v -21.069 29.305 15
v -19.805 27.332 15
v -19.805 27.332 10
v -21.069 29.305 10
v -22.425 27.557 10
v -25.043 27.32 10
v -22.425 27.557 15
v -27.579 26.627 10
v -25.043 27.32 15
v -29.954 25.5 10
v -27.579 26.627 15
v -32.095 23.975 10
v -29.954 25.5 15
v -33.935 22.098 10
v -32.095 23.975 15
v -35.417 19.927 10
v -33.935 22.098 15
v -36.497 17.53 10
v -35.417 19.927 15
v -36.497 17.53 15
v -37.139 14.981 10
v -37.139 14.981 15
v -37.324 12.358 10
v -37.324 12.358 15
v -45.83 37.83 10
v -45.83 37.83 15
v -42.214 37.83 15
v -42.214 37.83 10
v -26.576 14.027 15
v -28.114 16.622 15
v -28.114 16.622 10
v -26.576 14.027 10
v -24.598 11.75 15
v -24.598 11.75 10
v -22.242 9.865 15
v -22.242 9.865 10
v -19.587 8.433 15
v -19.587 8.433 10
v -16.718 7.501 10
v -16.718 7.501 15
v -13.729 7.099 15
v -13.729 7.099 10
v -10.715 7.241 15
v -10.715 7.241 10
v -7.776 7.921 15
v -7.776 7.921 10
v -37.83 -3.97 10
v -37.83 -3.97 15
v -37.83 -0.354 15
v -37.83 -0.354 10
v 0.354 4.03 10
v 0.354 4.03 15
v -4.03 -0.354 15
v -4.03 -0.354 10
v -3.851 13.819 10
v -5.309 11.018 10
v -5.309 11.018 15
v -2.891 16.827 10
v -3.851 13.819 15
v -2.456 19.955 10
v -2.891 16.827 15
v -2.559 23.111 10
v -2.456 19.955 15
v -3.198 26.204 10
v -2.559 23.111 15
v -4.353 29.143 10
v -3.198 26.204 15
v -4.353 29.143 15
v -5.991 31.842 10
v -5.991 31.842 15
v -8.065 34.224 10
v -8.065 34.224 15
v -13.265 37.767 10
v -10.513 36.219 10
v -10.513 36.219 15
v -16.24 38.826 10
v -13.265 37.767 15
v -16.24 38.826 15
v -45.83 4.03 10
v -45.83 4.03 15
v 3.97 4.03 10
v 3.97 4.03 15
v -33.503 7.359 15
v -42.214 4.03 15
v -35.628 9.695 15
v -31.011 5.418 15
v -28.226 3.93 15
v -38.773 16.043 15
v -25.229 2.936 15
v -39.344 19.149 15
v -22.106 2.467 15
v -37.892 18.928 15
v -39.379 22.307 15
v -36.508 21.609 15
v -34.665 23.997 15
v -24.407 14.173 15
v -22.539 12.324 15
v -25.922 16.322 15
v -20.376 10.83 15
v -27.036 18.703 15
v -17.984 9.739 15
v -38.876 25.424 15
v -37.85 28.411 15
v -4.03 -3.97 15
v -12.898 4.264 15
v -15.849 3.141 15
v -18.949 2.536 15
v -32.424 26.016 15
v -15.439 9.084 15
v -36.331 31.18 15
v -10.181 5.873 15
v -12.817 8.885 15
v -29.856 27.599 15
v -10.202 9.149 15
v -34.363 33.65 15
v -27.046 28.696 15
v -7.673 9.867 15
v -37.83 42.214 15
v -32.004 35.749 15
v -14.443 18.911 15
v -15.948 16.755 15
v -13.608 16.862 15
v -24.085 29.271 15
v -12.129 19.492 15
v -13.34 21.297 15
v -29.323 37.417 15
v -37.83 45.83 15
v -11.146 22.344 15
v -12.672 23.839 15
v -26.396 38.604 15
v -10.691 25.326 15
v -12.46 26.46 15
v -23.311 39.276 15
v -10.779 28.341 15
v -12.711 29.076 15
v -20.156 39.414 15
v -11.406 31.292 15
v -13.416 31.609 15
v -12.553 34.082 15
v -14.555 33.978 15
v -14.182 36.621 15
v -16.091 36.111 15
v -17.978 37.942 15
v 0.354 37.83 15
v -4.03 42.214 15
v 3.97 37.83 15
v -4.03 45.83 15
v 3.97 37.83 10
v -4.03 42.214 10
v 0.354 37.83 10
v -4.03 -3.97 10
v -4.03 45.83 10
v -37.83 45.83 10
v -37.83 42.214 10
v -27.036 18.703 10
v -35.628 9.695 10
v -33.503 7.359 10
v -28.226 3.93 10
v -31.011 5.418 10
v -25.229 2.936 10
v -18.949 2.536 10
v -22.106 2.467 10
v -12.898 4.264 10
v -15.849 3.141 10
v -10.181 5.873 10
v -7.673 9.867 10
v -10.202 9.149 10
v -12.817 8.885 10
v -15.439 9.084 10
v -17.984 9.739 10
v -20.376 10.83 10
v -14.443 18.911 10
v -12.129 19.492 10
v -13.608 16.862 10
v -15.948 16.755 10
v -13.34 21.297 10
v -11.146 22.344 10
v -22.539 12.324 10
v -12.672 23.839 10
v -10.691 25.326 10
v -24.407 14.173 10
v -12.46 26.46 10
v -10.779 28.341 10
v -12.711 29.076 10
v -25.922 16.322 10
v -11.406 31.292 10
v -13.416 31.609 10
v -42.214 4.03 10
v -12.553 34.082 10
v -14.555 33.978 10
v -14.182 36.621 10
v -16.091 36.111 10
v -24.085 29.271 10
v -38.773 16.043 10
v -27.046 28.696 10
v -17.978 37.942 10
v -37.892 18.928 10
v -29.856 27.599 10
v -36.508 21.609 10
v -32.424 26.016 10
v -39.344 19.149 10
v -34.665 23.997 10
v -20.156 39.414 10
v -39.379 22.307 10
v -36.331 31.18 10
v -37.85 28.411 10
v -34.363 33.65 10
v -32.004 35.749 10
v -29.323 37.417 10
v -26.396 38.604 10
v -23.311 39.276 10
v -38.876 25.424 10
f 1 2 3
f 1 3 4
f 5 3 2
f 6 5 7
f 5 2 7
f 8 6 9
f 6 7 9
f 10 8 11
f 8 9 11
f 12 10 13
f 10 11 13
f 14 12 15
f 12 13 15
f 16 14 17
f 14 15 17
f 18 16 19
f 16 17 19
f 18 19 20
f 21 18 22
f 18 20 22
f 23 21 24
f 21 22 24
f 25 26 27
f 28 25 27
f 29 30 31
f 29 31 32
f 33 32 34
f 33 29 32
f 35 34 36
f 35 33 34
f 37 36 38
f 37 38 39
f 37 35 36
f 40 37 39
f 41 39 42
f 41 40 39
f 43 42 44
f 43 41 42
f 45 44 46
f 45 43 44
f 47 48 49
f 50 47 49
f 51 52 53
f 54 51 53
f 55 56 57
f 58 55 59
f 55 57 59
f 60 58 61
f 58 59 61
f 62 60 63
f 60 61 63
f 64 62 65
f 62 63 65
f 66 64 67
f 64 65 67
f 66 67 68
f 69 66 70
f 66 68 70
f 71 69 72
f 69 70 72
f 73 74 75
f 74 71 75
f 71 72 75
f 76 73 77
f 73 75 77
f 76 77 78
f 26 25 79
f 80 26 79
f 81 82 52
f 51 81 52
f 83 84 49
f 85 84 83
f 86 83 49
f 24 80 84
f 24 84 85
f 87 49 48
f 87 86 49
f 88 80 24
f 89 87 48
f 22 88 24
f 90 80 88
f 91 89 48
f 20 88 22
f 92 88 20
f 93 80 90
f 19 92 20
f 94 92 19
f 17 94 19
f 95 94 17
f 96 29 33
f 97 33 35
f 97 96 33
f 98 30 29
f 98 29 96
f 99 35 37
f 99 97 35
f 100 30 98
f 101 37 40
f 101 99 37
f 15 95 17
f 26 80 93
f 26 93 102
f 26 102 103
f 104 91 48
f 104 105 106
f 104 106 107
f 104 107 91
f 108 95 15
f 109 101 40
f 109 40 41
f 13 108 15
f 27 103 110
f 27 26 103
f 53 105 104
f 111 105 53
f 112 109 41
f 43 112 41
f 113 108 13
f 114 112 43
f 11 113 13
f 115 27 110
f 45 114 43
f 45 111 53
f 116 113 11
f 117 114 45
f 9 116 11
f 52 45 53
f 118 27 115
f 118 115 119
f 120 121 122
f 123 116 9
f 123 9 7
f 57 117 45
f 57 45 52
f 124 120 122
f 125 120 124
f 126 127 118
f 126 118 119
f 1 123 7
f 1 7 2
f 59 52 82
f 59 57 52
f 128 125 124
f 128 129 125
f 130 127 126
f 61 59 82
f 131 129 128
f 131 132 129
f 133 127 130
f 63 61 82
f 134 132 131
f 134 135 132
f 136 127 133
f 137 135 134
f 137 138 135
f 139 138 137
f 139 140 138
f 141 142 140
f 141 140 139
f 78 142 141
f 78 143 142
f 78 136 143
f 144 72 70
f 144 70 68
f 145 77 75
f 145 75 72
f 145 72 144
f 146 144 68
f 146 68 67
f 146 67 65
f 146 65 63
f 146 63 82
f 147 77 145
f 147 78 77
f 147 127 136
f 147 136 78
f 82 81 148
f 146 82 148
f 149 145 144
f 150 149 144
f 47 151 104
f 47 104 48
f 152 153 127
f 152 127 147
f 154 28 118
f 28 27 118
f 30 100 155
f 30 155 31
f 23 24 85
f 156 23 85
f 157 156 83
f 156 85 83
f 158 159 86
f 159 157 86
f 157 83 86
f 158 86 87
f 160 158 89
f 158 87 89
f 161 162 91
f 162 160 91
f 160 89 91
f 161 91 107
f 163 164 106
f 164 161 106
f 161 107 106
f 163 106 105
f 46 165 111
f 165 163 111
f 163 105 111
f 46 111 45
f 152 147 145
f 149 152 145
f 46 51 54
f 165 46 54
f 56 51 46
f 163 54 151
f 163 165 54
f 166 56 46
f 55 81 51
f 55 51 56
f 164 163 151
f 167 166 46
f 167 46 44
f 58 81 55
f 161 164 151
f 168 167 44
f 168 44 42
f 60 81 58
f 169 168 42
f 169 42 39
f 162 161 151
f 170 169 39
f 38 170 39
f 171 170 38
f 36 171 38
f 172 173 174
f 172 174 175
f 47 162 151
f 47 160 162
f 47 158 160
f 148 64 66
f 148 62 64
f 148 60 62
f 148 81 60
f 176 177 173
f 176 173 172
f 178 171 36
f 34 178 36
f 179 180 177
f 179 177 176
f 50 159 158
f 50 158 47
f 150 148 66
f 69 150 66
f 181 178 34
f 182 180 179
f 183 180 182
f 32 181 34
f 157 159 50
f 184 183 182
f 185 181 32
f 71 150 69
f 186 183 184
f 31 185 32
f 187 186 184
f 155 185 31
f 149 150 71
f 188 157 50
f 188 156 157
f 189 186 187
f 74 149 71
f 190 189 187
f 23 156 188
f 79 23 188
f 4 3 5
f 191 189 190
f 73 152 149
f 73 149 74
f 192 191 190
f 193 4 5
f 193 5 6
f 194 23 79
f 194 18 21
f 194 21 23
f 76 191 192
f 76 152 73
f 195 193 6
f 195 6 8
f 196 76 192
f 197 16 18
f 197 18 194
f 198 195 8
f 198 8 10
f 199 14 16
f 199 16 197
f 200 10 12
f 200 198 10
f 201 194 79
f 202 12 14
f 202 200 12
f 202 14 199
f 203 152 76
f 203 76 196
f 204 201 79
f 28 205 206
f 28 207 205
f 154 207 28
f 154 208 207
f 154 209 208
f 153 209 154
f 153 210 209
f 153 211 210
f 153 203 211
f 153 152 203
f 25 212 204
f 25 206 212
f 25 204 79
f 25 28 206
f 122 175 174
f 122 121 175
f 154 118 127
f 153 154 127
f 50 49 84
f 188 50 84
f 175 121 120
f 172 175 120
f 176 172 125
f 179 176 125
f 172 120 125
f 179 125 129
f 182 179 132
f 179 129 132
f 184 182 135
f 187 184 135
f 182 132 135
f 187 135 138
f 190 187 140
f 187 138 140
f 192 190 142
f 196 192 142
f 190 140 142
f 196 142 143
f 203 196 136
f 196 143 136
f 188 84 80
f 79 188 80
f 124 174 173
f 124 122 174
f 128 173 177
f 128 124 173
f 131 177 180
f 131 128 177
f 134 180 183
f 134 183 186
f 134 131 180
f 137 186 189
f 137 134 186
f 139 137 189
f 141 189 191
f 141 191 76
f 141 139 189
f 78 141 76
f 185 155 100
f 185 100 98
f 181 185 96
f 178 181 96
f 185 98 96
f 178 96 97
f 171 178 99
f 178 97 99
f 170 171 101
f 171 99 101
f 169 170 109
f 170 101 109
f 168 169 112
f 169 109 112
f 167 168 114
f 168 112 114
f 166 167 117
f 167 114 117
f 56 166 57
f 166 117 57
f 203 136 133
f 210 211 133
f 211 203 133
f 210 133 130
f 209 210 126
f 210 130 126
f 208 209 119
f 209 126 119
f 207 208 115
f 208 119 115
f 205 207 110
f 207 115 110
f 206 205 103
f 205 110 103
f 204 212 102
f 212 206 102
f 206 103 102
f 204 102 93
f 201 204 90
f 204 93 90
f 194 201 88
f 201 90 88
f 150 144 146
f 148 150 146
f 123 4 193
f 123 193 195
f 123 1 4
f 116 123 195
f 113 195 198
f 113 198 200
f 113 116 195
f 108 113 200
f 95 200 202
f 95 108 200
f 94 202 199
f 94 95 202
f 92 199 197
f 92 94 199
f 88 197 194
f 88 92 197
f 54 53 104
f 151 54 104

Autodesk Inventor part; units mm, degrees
ref_plane "YZ Plane" through (0, 0, 0) normal (1, 0, 0) x (0, 1, 0)
ref_plane "Work Plane1" through (0, 0, 10) normal (0, 0, 1) x (1, 0, 0)
sketch "Sketch1" plane through (0, 0, 10) normal (0, 0, 1) x (1, 0, 0)
  line L0 (-4.0299, -0.3538) -> (-2.2322, 1.4439) construction
  arc A0 (-1.4439, 2.2322) -> (-2.2322, 1.4439) centre (-0.9299, 0.9299) ccw construction
  line L1 (-1.4439, 2.2322) -> (0.3538, 4.0299) construction
  line L2 (-37.8299, 42.2137) -> (-37.8299, 45.8299) construction
  line L3 (-37.8299, 45.8299) -> (-4.0299, 45.8299) construction
  line L4 (-4.0299, 45.8299) -> (-4.0299, 42.2137) construction
  line L5 (-4.0299, 4.0299) -> (0.3538, 4.0299) projected
  line L6 (-20.9299, 58.9723) -> (17.1124, 20.9299) construction
  line L7 (17.1124, 20.9299) -> (-20.9299, -17.1124) construction
  line L8 (-20.9299, -17.1124) -> (-58.9723, 20.9299) construction
  line L9 (-58.9723, 20.9299) -> (-20.9299, 58.9723) construction
  line L10 (-20.9299, 58.9723) -> (-20.9299, -17.1124) construction
  line L11 (17.1124, 20.9299) -> (-58.9723, 20.9299) construction
  line L12 (-20.9299, 58.9723) -> (32.8701, 58.9723) construction
  line L13 (-43.4299, 43.4299) -> (1.5701, 43.4299) construction
  line L14 (1.5701, 43.4299) -> (1.5701, -1.5701) construction
  line L15 (1.5701, -1.5701) -> (-43.4299, -1.5701) construction
  line L16 (-43.4299, -1.5701) -> (-43.4299, 43.4299) construction
  line L17 (-43.4299, 43.4299) -> (1.5701, -1.5701) construction
  line L18 (1.5701, 43.4299) -> (-43.4299, -1.5701) construction
  line L19 (-43.4299, 5.3876) -> (-43.4299, 36.4723)
  line L20 (-43.4299, 36.4723) -> (-36.4723, 43.4299)
  line L21 (-36.4723, 43.4299) -> (-5.3876, 43.4299)
  line L22 (-5.3876, 43.4299) -> (1.5701, 36.4723)
  line L23 (1.5701, 36.4723) -> (1.5701, 5.3876)
  line L24 (1.5701, 5.3876) -> (-5.3876, -1.5701)
  line L25 (-5.3876, -1.5701) -> (-36.4723, -1.5701)
  line L26 (-36.4723, -1.5701) -> (-43.4299, 5.3876)
  line L27 (-4.0299, 42.2137) -> (-37.8299, 42.2137) projected
  line L28 (-4.0299, -0.3538) -> (-4.0299, 4.0299) projected
  circle A1 centre (-20.9299, 20.9299) radius 13.3985
  circle A2 centre (-20.9299, 20.9299) radius 15.4895
  point P0 (-37.8299, 4.0299)
  dimension "d18" = 53.8
  dimension "d19" = 45
  dimension "d20" = 53.8
  dimension "d21" = 45
  dimension "d22" = 45
  dimension "d30" = 26.797
  dimension "d36" = 30.979
extrude "Extrusion1" add sketch "Sketch1" along normal blind 5 contours L28 L24 L25 L26 L19 L20 L27 L22 L23 L5 | L5 L24 L28 | L27 L20 L21 L22 | A1 | A2
ref_plane "Work Plane2" through (-40.9959, 0.8639, 22.2359) normal (0, 0, 1) x (1, 0, 0)
sketch "Sketch3" plane through (0, 0, 10) normal (0, 0, -1) x (-1, 0, 0)
  line L0 (37.8299, -0.4701) -> (37.8299, 4.0299) construction
  line L1 (4.0299, 4.0299) -> (4.0299, -0.4701) construction
  line L2 (37.8299, -0.4701) -> (37.8299, 1.1886) construction
  line L3 (4.0299, -3.9701) -> (4.0299, -0.3538) construction
  line L4 (45.8299, 4.0299) -> (42.2137, 4.0299) construction
  line L5 (-0.3538, 4.0299) -> (-3.9701, 4.0299) construction
  line L6 (-3.9701, 37.8299) -> (-0.3538, 37.8299) construction
  line L7 (4.0299, 42.2137) -> (4.0299, 45.8299) construction
  line L8 (37.8299, 45.8299) -> (37.8299, 42.2137) construction
  line L9 (42.2137, 37.8299) -> (45.8299, 37.8299) construction
  line L10 (37.8299, 37.7299) -> (45.8299, 37.7299)
  line L11 (45.8299, 37.7299) -> (45.8299, 4.1299)
  line L12 (45.8299, 4.1299) -> (37.8299, 4.1299)
  line L13 (37.8299, 4.1299) -> (37.8299, 37.7299)
  line L14 (37.7299, 4.0299) -> (4.1299, 4.0299)
  line L15 (4.1299, 4.0299) -> (4.1299, -3.9701)
  line L16 (4.1299, -3.9701) -> (37.7299, -3.9701)
  line L17 (37.7299, -3.9701) -> (37.7299, 4.0299)
  line L18 (4.0299, 4.1299) -> (-3.9701, 4.1299)
  line L19 (-3.9701, 4.1299) -> (-3.9701, 37.7299)
  line L20 (-3.9701, 37.7299) -> (4.0299, 37.7299)
  line L21 (4.0299, 37.7299) -> (4.0299, 4.1299)
  line L22 (4.1299, 37.8299) -> (37.7299, 37.8299)
  line L23 (37.7299, 37.8299) -> (37.7299, 45.8299)
  line L24 (37.7299, 45.8299) -> (4.1299, 45.8299)
  line L25 (4.1299, 45.8299) -> (4.1299, 37.8299)
  point P0 (0, 0)
  dimension "d23" = 0.1
  dimension "d24" = 0.1
  dimension "d25" = 0.1
  dimension "d26" = 0.1
  dimension "d27" = 0.1
extrude "Extrusion3" add sketch "Sketch3" against normal up to surface (5 mm away)
sketch "Sketch6" plane through (0, 0, 15) normal (0, 0, 1) x (1, 0, 0)
  circle A0 centre (-20.9299, 20.9299) radius 18.5
  circle A1 centre (-20.9299, 20.9299) radius 13.3985
  line L0 (-45.8299, 4.1299) -> (-45.8299, 37.7299) projected
  line L1 (-4.1299, -3.9701) -> (-37.7299, -3.9701) projected
  line L2 (-37.7299, 45.8299) -> (-4.1299, 45.8299) projected
  point P0 (0, 0)
  point P1 (-45.8299, 20.9299)
  point P2 (-20.9299, -3.9701)
  point P3 (-20.9299, 45.8299)
  dimension "d37" = 26.797
  dimension "d38" = 37
extrude "Extrusion5" cut sketch "Sketch6" against normal blind 12 contours A0 | A1
sketch "Sketch7" plane through (0, 0, 15) normal (0, 0, 1) x (1, 0, 0)
  arc A0 (-7.3514, 4.1907) -> (-4.1915, 7.0829) centre (-15.9478, 16.7551) ccw
  arc A1 (-7.3514, 4.1907) -> (-4.1915, 7.0829) centre (-15.9478, 16.7551) ccw
  circle A2 centre (-20.9299, 20.9299) radius 18.5 construction
  circle A3 centre (-20.9299, 20.9299) radius 6.5 construction
  arc A4 (-15.9478, 16.7551) -> (-20.1559, 39.4137) centre (-27.3968, 26.3489) ccw
  arc A5 (-13.6076, 16.8625) -> (-16.2405, 38.8257) centre (-27.3968, 26.3489) ccw
  arc A6 (-16.2405, 38.8257) -> (-20.1559, 39.4137) centre (-20.9299, 20.9299) ccw
  line L0 (-15.9478, 16.7551) -> (-13.6076, 16.8625)
  point P0 (0, 0)
  point P1 (-25.3654, 35.7708)
  point P2 (-14.2, -44.8454)
  point P3 (-13.5804, 16.4347)
  point P4 (-13.5804, 8.5029)
  dimension "d79" = 13
  dimension "d83" = 1.8
extrude "Extrusion6" add sketch "Sketch7" against normal up to surface (5 mm away)
pattern_circular "Circular Pattern1" count 3 over 360 about axis through (-20.9299, 20.9299, 15) along (0, 0, -1) of "Extrusion6"
sketch "Skizze11" plane through (0, 0, 15) normal (0, 0, 1) x (1, 0, 0)
  arc A0 (-5.3095, 11.0177) -> (-16.2405, 38.8257) centre (-20.9299, 20.9299) ccw construction
  arc A1 (-27.0364, 18.7027) -> (-5.3095, 11.0177) centre (-13.0035, 23.8209) ccw construction
  line L0 (-28.1135, 16.6223) -> (-27.0364, 18.7027) construction
  arc A2 (-28.1135, 16.6223) -> (-7.7764, 7.9209) centre (-13.0035, 23.8209) ccw construction
  arc A3 (-37.3244, 12.3584) -> (-7.7764, 7.9209) centre (-20.9299, 20.9299) ccw construction
  arc A4 (-19.8055, 27.3319) -> (-37.3244, 12.3584) centre (-22.3895, 12.6199) ccw construction
  line L1 (-21.0686, 29.3049) -> (-19.8055, 27.3319) construction
  arc A5 (-21.0686, 29.3049) -> (-38.7728, 16.0432) centre (-22.3895, 12.6199) ccw construction
  arc A6 (-20.1559, 39.4137) -> (-38.7728, 16.0432) centre (-20.9299, 20.9299) ccw construction
  arc A7 (-15.9478, 16.7551) -> (-20.1559, 39.4137) centre (-27.3968, 26.3489) ccw construction
  line L2 (-13.6076, 16.8625) -> (-15.9478, 16.7551) construction
  arc A8 (-13.6076, 16.8625) -> (-16.2405, 38.8257) centre (-27.3968, 26.3489) ccw construction
  line L3 (3.9701, 4.1299) -> (0.3124, 4.1299) projected
  line L4 (3.9701, 37.7299) -> (3.9701, 4.1299) construction
  line L5 (0.3124, 37.7299) -> (3.9701, 37.7299) projected
  line L6 (0.3124, 37.7299) -> (-4.1299, 42.1723) projected
  line L7 (-4.1299, 45.8299) -> (-4.1299, 42.1723) projected
  line L8 (-37.7299, 45.8299) -> (-4.1299, 45.8299) construction
  line L9 (-37.7299, 42.1723) -> (-37.7299, 45.8299) projected
  line L10 (-37.7299, 42.1723) -> (-42.1723, 37.7299) projected
  line L11 (-45.8299, 37.7299) -> (-42.1723, 37.7299) projected
  line L12 (-45.8299, 4.1299) -> (-45.8299, 37.7299) construction
  line L13 (-42.1723, 4.1299) -> (-45.8299, 4.1299) projected
  line L14 (-42.1723, 4.1299) -> (-37.7299, -0.3124) projected
  line L15 (-37.7299, -3.9701) -> (-37.7299, -0.3124) projected
  line L16 (-4.1299, -3.9701) -> (-37.7299, -3.9701) construction
  line L17 (-4.1299, -0.3124) -> (-4.1299, -3.9701) projected
  line L18 (-4.1299, -0.3124) -> (0.3124, 4.1299) projected
  line L19 (-4.0299, 45.9299) -> (-4.0299, 42.2137)
  line L20 (-4.0299, 42.2137) -> (0.3538, 37.8299)
  line L21 (0.3538, 37.8299) -> (4.0701, 37.8299)
  line L22 (4.0701, 37.8299) -> (4.0701, 4.0299) construction
  line L23 (4.0701, 4.0299) -> (0.3538, 4.0299)
  line L24 (0.3538, 4.0299) -> (-4.0299, -0.3538)
  line L25 (-4.0299, -0.3538) -> (-4.0299, -4.0701)
  line L26 (-4.0299, -4.0701) -> (-37.8299, -4.0701) construction
  line L27 (-37.8299, -4.0701) -> (-37.8299, -0.3538)
  line L28 (-37.8299, -0.3538) -> (-42.2137, 4.0299)
  line L29 (-42.2137, 4.0299) -> (-45.9299, 4.0299)
  line L30 (-45.9299, 4.0299) -> (-45.9299, 37.8299) construction
  line L31 (-45.9299, 37.8299) -> (-42.2137, 37.8299)
  line L32 (-42.2137, 37.8299) -> (-37.8299, 42.2137)
  line L33 (-37.8299, 42.2137) -> (-37.8299, 45.9299)
  line L34 (-37.8299, 45.9299) -> (-4.0299, 45.9299) construction
  line L35 (-45.8299, 37.7299) -> (-45.8299, 37.8299)
  line L36 (-37.7299, 45.8299) -> (-37.8299, 45.8299)
  line L37 (-4.1299, 45.8299) -> (-4.0299, 45.8299)
  line L38 (3.9701, 37.7299) -> (3.9701, 37.8299)
  line L39 (3.9701, 37.7299) -> (3.9701, 4.1299) projected
  line L40 (3.9701, 4.1299) -> (3.9701, 4.0299)
  line L41 (-4.1299, -3.9701) -> (-4.0299, -3.9701)
  line L42 (-37.7299, -3.9701) -> (-37.8299, -3.9701)
  line L43 (-45.8299, 4.1299) -> (-45.8299, 4.0299)
  point P0 (0, 0)
  dimension "d84" = 0.1
extrude "IM_offset" add sketch "Skizze11" against normal up to surface (5 mm away)
properties part number "20_Cube_Insert_Objective_Holder_v3"
